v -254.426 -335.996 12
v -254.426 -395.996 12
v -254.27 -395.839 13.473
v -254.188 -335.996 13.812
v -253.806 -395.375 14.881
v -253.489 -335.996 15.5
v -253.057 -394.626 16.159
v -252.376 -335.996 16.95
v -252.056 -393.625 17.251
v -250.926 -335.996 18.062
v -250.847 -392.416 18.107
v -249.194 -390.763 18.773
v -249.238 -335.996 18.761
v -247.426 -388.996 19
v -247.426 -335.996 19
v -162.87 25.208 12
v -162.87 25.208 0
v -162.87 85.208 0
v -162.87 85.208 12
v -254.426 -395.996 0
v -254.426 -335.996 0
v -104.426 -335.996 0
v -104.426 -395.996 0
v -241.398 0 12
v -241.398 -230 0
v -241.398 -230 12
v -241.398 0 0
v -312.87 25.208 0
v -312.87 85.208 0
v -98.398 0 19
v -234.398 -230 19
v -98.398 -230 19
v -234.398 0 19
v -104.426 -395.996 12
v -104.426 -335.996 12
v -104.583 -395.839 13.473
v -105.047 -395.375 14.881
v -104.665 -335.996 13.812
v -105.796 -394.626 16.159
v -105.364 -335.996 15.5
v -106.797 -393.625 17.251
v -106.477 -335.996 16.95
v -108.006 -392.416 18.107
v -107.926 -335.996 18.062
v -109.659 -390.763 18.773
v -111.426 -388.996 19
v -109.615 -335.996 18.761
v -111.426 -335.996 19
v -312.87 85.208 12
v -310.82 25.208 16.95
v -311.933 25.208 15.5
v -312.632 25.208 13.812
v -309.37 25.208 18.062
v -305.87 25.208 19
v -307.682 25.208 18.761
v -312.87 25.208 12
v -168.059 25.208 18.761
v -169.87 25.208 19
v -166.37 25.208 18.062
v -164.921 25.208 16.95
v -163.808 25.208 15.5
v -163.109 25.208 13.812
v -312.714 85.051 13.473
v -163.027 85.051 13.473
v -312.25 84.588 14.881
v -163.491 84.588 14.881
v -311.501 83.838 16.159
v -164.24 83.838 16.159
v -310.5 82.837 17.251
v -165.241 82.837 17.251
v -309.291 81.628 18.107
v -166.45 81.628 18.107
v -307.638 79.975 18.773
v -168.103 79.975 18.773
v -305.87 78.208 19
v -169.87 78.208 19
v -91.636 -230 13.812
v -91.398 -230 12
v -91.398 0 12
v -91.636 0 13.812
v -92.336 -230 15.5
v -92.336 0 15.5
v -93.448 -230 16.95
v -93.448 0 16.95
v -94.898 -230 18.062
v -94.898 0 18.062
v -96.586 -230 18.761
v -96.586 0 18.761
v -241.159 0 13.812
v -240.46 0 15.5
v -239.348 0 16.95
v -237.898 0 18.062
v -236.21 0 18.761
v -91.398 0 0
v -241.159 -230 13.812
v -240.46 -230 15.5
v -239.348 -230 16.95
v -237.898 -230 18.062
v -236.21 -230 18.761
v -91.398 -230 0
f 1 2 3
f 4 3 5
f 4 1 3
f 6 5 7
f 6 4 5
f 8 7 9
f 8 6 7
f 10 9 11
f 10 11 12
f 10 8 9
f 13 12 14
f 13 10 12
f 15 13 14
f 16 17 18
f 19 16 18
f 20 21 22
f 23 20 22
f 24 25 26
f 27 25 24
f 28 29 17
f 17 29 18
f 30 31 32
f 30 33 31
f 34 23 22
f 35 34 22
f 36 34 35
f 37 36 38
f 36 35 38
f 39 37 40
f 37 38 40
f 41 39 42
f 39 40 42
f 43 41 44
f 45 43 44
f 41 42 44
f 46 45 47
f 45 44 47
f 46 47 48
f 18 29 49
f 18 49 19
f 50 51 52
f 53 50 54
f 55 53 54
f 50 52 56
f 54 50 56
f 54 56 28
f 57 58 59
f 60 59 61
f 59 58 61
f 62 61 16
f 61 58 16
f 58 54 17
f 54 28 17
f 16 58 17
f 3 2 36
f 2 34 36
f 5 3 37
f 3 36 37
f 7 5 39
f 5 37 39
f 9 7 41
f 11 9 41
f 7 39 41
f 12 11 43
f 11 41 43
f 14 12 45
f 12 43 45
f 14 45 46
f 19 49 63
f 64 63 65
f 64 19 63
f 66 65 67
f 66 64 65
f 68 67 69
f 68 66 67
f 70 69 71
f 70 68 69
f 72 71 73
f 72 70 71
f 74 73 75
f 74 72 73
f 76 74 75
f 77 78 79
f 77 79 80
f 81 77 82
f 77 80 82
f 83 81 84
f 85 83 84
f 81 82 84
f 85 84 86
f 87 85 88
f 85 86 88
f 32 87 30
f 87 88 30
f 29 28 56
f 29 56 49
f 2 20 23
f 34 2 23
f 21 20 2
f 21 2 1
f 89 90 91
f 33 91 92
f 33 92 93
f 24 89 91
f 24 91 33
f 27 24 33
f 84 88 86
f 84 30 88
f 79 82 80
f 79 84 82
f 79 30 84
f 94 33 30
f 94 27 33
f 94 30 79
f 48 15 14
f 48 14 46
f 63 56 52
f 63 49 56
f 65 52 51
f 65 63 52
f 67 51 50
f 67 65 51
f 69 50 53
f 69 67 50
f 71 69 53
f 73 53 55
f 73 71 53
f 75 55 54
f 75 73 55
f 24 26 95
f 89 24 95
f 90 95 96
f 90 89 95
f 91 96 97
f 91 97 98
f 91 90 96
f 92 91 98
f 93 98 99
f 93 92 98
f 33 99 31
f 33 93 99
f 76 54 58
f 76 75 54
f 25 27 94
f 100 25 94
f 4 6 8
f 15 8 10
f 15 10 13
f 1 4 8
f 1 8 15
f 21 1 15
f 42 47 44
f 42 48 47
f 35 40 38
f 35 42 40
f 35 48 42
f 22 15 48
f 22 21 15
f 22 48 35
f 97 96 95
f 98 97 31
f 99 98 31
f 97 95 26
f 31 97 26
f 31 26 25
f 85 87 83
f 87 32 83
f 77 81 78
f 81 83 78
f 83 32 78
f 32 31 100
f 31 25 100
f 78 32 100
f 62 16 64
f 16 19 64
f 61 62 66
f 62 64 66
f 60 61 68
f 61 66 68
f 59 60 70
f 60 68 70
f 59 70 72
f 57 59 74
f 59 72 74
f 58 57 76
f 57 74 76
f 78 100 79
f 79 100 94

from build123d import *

# Parameters (mm, degrees)
F0_W     = 150
F0_H     = 60
F2_DEPTH = 19
F1_W     = 150
F1_H     = 230
F3_DEPTH = 19
F4_W     = 150
F4_H     = 60
F5_DEPTH = 19
F6_R     = 7
F6_2_R   = 7
F6_3_R   = 7


with BuildPart() as f2:
    # F0 (on Top) → F2 (new body)
    with BuildSketch(Plane.XY):
        with Locations((-237.870327, 55.207736)):
            Rectangle(F0_W, F0_H)
    extrude(amount=F2_DEPTH)

    # F6#3
    f6_3_edges = [f2.edges().sort_by_distance(p)[0] for p in [
        (-162.870327, 55.207736, 19),
        (-237.870327, 85.207736, 19),
        (-312.870327, 55.207736, 19),
    ]]
    fillet(f6_3_edges, radius=F6_3_R)


with BuildPart() as f3:
    # F1 (on Top) → F3 (new body)
    with BuildSketch(Plane.XY):
        with Locations((-166.397809, -115)):
            Rectangle(F1_W, F1_H)
    extrude(amount=F3_DEPTH)

    # F6#2
    f6_2_edges = [f3.edges().sort_by_distance(p)[0] for p in [
        (-91.397809, -115, 19),
        (-241.397809, -115, 19),
    ]]
    fillet(f6_2_edges, radius=F6_2_R)


with BuildPart() as f5:
    # F4 (on Top) → F5 (new body)
    with BuildSketch(Plane.XY):
        with Locations((-179.426356, -365.9956)):
            Rectangle(F4_W, F4_H)
    extrude(amount=F5_DEPTH)

    # F6
    f6_edges = [f5.edges().sort_by_distance(p)[0] for p in [
        (-179.426356, -395.9956, 19),
        (-104.426356, -365.9956, 19),
        (-254.426356, -365.9956, 19),
    ]]
    fillet(f6_edges, radius=F6_R)


solid = Compound([f2.part, f3.part, f5.part])
